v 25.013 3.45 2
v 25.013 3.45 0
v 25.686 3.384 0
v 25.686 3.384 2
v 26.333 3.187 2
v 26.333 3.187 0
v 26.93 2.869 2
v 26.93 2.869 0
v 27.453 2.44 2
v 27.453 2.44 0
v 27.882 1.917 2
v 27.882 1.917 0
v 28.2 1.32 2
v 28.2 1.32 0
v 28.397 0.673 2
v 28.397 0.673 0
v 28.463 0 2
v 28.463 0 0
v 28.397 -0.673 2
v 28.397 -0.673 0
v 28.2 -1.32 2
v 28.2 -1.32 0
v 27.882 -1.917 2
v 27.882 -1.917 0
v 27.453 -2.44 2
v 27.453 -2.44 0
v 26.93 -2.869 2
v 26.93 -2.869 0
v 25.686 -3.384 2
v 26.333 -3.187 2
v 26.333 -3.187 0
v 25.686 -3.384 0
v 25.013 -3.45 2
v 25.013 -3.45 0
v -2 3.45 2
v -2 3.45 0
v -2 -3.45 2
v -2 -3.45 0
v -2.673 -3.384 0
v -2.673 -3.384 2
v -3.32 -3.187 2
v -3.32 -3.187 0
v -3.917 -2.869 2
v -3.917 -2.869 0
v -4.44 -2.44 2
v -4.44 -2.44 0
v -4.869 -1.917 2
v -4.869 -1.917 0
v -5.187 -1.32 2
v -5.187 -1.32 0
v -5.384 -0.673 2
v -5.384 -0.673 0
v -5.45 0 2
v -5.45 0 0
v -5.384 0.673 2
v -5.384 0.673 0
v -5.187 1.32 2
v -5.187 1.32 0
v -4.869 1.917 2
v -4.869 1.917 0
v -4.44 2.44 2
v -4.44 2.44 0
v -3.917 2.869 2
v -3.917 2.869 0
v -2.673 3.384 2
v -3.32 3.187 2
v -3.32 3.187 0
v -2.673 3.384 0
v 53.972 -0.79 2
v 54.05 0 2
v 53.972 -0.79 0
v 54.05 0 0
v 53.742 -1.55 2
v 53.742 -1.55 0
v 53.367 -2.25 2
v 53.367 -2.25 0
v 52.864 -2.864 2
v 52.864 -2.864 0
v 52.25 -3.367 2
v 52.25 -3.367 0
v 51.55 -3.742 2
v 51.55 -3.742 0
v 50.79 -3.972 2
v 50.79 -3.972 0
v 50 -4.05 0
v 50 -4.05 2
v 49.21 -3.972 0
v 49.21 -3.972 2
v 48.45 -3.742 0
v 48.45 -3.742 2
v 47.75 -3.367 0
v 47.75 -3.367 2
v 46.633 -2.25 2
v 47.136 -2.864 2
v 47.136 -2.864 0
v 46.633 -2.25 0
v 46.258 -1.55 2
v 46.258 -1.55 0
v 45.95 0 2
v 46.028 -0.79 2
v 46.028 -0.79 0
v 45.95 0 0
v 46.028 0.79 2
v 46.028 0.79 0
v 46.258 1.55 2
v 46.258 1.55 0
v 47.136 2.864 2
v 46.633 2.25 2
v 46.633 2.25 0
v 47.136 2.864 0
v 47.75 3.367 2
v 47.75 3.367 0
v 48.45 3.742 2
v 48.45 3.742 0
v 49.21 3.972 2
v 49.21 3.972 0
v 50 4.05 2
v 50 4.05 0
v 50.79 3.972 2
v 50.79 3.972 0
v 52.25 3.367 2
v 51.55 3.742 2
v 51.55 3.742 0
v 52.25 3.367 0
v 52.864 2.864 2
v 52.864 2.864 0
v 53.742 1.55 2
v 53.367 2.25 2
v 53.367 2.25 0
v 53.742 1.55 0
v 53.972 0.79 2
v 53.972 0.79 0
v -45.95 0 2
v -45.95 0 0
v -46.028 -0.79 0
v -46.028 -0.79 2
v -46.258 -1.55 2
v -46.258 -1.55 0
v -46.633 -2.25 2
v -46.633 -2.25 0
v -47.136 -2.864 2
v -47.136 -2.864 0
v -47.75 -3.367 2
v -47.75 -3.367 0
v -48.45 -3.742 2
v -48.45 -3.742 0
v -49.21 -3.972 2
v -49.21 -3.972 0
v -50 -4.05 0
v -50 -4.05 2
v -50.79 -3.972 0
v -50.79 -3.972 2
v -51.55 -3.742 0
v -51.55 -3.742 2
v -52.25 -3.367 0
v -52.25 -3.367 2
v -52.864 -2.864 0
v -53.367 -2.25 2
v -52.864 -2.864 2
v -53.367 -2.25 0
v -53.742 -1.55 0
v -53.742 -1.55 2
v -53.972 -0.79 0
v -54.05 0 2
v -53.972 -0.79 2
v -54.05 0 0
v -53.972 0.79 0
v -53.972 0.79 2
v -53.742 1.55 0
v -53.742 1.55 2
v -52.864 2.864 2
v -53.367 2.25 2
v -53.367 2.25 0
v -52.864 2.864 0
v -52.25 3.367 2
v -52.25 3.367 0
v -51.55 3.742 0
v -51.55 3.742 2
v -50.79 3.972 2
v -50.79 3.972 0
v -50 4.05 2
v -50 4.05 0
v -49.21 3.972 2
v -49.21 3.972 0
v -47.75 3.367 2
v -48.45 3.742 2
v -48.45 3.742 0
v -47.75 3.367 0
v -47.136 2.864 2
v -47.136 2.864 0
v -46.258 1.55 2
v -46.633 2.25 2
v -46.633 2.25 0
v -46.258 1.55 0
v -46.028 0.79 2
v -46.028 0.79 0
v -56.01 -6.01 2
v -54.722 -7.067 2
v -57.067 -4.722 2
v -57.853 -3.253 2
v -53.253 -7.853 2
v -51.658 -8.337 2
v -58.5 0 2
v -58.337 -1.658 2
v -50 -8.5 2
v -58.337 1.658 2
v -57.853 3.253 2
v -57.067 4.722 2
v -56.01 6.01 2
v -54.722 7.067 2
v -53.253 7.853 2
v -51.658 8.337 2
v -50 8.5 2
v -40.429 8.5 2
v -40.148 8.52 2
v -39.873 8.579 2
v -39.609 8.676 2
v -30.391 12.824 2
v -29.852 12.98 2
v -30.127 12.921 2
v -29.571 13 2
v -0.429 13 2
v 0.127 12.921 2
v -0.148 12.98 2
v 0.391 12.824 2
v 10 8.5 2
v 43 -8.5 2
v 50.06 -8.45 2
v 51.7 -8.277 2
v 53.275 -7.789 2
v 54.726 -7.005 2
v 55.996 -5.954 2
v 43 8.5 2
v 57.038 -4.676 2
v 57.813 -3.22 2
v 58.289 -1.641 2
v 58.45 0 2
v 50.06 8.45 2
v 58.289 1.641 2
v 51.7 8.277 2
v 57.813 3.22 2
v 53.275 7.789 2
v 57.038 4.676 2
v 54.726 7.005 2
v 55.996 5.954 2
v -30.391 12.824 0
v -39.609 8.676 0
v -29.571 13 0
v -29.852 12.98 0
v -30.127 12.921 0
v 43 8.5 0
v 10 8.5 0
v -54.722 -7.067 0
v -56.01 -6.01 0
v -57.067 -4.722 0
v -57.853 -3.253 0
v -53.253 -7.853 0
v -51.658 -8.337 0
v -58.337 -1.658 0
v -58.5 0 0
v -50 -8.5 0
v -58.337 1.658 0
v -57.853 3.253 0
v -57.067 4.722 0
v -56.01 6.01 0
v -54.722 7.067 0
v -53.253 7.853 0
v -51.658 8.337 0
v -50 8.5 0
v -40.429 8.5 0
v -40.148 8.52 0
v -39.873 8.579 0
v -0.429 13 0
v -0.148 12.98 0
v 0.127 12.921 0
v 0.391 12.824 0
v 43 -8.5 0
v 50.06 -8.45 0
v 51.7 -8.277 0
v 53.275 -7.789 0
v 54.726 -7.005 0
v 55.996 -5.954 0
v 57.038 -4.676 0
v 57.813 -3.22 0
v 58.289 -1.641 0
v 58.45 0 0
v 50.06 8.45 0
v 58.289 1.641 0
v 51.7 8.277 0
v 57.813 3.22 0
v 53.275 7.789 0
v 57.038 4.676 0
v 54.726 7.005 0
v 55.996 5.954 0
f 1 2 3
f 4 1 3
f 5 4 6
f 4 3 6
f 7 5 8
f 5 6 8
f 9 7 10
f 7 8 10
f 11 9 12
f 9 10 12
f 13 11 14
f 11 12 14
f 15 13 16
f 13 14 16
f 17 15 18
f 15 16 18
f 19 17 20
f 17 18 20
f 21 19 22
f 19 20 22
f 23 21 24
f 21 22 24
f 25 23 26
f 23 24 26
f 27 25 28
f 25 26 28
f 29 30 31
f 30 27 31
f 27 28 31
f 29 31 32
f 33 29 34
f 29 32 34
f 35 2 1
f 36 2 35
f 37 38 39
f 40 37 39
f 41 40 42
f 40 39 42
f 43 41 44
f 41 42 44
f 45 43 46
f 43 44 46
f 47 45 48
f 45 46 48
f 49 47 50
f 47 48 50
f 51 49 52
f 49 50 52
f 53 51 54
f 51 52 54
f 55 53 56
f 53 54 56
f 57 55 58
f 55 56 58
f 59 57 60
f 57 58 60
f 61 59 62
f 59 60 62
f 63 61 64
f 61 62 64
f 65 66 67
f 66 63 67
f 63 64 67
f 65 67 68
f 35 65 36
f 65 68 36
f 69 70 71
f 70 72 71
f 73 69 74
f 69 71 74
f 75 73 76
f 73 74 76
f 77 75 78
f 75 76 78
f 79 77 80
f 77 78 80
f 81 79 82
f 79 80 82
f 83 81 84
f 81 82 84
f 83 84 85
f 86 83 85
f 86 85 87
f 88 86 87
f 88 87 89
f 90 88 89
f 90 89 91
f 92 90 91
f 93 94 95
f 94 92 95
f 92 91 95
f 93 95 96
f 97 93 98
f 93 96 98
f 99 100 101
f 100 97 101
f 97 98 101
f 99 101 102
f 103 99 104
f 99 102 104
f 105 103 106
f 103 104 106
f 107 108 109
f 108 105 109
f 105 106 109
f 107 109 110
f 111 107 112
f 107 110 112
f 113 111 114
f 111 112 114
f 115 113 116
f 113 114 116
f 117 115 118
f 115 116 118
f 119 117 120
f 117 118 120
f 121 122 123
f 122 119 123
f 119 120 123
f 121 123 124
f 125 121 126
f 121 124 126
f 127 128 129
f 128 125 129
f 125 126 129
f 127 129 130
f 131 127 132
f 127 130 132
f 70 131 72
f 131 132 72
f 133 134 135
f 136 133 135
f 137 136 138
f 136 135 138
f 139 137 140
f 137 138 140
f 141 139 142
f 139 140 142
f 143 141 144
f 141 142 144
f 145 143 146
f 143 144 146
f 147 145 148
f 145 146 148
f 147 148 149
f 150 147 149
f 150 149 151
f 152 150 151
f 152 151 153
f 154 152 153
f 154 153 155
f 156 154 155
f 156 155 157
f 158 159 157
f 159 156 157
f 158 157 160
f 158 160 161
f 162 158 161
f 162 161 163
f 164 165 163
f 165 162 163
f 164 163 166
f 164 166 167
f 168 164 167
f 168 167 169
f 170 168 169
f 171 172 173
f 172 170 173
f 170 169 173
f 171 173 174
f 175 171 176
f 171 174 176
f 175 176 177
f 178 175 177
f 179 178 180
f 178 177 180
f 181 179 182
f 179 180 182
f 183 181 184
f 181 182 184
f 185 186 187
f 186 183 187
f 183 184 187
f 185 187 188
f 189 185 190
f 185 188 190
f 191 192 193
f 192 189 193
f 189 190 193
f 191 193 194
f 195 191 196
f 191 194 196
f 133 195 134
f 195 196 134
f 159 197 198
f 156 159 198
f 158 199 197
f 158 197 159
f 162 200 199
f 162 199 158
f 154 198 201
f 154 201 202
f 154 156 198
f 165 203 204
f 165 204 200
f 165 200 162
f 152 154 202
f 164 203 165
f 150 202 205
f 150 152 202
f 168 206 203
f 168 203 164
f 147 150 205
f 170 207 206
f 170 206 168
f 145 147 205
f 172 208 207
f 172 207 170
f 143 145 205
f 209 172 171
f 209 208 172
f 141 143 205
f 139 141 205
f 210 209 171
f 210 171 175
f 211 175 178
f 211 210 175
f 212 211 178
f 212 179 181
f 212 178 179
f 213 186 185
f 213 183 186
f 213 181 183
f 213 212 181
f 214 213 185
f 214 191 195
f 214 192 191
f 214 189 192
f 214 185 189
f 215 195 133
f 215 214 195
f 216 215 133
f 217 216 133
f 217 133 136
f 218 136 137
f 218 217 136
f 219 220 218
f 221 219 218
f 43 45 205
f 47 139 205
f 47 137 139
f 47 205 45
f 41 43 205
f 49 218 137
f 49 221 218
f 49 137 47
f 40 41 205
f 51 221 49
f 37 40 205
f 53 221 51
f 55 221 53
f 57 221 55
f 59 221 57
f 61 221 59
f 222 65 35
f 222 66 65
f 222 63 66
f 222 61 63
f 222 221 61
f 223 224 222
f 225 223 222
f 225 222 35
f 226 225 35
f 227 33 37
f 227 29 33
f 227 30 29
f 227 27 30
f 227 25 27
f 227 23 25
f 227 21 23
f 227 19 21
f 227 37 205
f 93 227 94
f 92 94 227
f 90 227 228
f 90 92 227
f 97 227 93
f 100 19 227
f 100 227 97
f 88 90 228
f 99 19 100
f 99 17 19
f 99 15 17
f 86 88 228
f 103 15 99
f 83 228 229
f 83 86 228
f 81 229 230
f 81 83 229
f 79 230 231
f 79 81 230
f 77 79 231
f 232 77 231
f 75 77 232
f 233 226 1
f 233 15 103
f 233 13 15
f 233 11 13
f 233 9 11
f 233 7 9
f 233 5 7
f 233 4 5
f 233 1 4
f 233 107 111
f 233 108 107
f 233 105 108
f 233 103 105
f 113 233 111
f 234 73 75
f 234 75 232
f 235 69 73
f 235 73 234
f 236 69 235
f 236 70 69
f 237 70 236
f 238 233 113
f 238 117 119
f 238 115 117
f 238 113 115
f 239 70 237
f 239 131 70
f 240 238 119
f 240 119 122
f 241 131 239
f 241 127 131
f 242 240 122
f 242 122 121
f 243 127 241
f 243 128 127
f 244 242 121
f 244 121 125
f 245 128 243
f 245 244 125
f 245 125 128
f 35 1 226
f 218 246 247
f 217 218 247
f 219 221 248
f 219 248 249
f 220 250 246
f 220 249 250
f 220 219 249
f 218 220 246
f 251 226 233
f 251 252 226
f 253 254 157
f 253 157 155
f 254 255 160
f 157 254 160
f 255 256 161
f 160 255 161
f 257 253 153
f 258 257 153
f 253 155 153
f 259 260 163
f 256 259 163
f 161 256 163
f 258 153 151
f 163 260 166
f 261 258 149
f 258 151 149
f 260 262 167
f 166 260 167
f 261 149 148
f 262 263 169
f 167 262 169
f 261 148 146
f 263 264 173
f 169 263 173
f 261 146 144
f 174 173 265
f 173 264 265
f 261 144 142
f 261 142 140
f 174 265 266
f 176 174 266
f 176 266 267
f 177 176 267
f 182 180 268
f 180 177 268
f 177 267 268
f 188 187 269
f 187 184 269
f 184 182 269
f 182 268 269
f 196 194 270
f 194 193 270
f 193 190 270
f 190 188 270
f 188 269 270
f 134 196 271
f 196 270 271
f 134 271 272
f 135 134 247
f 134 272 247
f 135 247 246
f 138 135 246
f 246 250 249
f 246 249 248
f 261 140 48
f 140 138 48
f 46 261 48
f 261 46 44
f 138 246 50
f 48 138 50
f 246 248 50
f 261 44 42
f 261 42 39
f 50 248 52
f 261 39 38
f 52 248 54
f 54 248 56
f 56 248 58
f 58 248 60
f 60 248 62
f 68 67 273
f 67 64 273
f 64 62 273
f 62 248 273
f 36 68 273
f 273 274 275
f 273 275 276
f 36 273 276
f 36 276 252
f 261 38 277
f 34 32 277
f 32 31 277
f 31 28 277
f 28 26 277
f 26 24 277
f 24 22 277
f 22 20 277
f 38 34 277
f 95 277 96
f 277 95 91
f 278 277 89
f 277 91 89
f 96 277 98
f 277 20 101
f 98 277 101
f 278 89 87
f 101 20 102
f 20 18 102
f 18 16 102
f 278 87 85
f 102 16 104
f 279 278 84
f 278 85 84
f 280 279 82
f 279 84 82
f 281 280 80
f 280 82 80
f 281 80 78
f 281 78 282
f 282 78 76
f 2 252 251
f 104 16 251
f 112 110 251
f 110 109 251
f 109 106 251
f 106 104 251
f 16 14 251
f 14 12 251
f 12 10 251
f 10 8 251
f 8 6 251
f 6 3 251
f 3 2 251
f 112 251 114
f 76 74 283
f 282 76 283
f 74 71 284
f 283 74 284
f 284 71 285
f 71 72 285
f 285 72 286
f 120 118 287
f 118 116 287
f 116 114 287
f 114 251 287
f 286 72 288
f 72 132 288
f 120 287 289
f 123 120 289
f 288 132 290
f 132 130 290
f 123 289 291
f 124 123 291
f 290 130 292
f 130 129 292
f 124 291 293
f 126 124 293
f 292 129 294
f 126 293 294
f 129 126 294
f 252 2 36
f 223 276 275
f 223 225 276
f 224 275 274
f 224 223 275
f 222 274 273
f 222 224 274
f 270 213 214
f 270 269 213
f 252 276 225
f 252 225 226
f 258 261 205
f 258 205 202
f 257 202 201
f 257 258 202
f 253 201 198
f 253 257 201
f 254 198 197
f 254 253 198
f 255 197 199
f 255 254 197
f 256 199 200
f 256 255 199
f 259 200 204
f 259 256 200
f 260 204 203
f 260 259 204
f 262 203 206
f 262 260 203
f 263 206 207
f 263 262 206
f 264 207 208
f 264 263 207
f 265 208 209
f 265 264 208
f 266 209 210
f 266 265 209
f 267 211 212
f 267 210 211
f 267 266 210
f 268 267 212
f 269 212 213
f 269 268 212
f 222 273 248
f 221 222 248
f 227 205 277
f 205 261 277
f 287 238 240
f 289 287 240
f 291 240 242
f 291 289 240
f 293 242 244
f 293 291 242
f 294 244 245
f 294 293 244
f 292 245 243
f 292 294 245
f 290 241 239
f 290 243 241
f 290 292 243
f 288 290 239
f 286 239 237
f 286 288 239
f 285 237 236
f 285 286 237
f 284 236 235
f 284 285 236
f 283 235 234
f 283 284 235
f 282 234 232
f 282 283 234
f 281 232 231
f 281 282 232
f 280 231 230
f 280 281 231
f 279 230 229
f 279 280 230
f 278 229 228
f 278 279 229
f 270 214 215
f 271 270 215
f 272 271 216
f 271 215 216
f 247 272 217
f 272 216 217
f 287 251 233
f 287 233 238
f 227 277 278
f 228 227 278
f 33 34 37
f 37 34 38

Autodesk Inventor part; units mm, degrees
ref_plane "YZ Plane" through (0, 0, 0) normal (1, 0, 0) x (0, 1, 0)
ref_plane "XZ Plane" through (0, 0, 0) normal (0, 1, 0) x (-1, 0, 0)
ref_plane "XY Plane" through (0, 0, 0) normal (0, 0, 1) x (1, 0, 0)
sketch "スケッチ1" plane through (0, 0, 0) normal (0, 0, 1) x (1, 0, 0)
  line L0 (-50, 0) -> (50, 0) construction
  circle A0 centre (-50, 0) radius 4.05
  circle A1 centre (50, 0) radius 4.05
  line L1 (-50, 8.5) -> (43, 8.5)
  line L2 (-50, -8.5) -> (43, -8.5)
  arc A2 (-50, 8.5) -> (-50, -8.5) centre (-50, 0) ccw
  arc A3 (25.013, -3.45) -> (25.013, 3.45) centre (25.013, 0) ccw
  line L3 (25.013, -3.45) -> (-2, -3.45)
  line L4 (25.013, 3.45) -> (-2, 3.45)
  arc A4 (-2, 3.45) -> (-2, -3.45) centre (-2, 0) ccw
  line L5 (43, -8.5) -> (50.0601, -8.4498)
  line L6 (43, 8.5) -> (50.0601, 8.4498)
  arc A5 (50.0601, -8.4498) -> (50.0601, 8.4498) centre (50, 0) ccw
  line L7 (-41, -8.5) -> (-12, -8.5) construction
  line L8 (-12, -8.5) -> (-12, -3.5) construction
  line L9 (-12, -3.5) -> (-41, -3.5) construction
  line L10 (-41, -3.5) -> (-41, -8.5) construction
  line L11 (-41, -6) -> (-12, -6) construction
  circle A6 centre (-26.5, -6) radius 1.55
  circle A7 centre (-38.5, -6) radius 1.55
  circle A8 centre (-14.5, -6) radius 1.55
  line L12 (-26.5, -6) -> (-26.5, -3.5) construction
  line L13 (0, 13) -> (-30, 13)
  line L14 (-30, 13) -> (-40, 8.5)
  line L15 (0, 13) -> (10, 8.5)
  point P0 (0, 0)
  point P1 (0, 0)
  dimension "d0" = 100
  dimension "d1" = 8.1
  dimension "d2" = 8.5
  dimension "d5" = 3.45
  dimension "d7" = 52
  dimension "d8" = 8.1
  dimension "d9" = 7
  dimension "d10" = 8.45
  dimension "d11" = 27.013
  dimension "d12" = 5
  dimension "d13" = 29
  dimension "d14" = 3.1
  dimension "d15" = 2.5
  dimension "d16" = 9
  dimension "d17" = 13
  dimension "d19" = 10
  dimension "d20" = 30
  dimension "d22" = 10
  dimension "d23" = 40
  dimension "d24" = 0
extrude "押し出し1" add sketch "スケッチ1" along normal blind 2
fillet "フィレット1" radius 2 4 edges at (-40, 8.5, 1) (-30, 13, 1) (0, 13, 1) (43, 8.5, 1)
sketch "スケッチ2" plane through (0, 0, 0) normal (0, 0, -1) x (-1, 0, 0)
  circle A0 centre (38.5, -6) radius 1.55 projected
  circle A1 centre (38.5, -6) radius 1.55
  circle A2 centre (26.5, -6) radius 1.55 projected
  circle A3 centre (26.5, -6) radius 1.55
  circle A4 centre (14.5, -6) radius 1.55 projected
  circle A5 centre (14.5, -6) radius 1.55
  point P0 (0, 0)
extrude "押し出し2" add sketch "スケッチ2" against normal up to surface (2 mm away)
equation "\"d7\" = 2 * d28"
equation "\"d8\" = d1"
equation "\"d11\" = d39"
equation "\"d19\" = d18"
equation "\"d22\" = d19"
equation "\"d28\" = 26"
equation "\"d39\" = 27.012989"
equation "\"d18\" = 10"
properties part number "rinnku" material "GFRP"
